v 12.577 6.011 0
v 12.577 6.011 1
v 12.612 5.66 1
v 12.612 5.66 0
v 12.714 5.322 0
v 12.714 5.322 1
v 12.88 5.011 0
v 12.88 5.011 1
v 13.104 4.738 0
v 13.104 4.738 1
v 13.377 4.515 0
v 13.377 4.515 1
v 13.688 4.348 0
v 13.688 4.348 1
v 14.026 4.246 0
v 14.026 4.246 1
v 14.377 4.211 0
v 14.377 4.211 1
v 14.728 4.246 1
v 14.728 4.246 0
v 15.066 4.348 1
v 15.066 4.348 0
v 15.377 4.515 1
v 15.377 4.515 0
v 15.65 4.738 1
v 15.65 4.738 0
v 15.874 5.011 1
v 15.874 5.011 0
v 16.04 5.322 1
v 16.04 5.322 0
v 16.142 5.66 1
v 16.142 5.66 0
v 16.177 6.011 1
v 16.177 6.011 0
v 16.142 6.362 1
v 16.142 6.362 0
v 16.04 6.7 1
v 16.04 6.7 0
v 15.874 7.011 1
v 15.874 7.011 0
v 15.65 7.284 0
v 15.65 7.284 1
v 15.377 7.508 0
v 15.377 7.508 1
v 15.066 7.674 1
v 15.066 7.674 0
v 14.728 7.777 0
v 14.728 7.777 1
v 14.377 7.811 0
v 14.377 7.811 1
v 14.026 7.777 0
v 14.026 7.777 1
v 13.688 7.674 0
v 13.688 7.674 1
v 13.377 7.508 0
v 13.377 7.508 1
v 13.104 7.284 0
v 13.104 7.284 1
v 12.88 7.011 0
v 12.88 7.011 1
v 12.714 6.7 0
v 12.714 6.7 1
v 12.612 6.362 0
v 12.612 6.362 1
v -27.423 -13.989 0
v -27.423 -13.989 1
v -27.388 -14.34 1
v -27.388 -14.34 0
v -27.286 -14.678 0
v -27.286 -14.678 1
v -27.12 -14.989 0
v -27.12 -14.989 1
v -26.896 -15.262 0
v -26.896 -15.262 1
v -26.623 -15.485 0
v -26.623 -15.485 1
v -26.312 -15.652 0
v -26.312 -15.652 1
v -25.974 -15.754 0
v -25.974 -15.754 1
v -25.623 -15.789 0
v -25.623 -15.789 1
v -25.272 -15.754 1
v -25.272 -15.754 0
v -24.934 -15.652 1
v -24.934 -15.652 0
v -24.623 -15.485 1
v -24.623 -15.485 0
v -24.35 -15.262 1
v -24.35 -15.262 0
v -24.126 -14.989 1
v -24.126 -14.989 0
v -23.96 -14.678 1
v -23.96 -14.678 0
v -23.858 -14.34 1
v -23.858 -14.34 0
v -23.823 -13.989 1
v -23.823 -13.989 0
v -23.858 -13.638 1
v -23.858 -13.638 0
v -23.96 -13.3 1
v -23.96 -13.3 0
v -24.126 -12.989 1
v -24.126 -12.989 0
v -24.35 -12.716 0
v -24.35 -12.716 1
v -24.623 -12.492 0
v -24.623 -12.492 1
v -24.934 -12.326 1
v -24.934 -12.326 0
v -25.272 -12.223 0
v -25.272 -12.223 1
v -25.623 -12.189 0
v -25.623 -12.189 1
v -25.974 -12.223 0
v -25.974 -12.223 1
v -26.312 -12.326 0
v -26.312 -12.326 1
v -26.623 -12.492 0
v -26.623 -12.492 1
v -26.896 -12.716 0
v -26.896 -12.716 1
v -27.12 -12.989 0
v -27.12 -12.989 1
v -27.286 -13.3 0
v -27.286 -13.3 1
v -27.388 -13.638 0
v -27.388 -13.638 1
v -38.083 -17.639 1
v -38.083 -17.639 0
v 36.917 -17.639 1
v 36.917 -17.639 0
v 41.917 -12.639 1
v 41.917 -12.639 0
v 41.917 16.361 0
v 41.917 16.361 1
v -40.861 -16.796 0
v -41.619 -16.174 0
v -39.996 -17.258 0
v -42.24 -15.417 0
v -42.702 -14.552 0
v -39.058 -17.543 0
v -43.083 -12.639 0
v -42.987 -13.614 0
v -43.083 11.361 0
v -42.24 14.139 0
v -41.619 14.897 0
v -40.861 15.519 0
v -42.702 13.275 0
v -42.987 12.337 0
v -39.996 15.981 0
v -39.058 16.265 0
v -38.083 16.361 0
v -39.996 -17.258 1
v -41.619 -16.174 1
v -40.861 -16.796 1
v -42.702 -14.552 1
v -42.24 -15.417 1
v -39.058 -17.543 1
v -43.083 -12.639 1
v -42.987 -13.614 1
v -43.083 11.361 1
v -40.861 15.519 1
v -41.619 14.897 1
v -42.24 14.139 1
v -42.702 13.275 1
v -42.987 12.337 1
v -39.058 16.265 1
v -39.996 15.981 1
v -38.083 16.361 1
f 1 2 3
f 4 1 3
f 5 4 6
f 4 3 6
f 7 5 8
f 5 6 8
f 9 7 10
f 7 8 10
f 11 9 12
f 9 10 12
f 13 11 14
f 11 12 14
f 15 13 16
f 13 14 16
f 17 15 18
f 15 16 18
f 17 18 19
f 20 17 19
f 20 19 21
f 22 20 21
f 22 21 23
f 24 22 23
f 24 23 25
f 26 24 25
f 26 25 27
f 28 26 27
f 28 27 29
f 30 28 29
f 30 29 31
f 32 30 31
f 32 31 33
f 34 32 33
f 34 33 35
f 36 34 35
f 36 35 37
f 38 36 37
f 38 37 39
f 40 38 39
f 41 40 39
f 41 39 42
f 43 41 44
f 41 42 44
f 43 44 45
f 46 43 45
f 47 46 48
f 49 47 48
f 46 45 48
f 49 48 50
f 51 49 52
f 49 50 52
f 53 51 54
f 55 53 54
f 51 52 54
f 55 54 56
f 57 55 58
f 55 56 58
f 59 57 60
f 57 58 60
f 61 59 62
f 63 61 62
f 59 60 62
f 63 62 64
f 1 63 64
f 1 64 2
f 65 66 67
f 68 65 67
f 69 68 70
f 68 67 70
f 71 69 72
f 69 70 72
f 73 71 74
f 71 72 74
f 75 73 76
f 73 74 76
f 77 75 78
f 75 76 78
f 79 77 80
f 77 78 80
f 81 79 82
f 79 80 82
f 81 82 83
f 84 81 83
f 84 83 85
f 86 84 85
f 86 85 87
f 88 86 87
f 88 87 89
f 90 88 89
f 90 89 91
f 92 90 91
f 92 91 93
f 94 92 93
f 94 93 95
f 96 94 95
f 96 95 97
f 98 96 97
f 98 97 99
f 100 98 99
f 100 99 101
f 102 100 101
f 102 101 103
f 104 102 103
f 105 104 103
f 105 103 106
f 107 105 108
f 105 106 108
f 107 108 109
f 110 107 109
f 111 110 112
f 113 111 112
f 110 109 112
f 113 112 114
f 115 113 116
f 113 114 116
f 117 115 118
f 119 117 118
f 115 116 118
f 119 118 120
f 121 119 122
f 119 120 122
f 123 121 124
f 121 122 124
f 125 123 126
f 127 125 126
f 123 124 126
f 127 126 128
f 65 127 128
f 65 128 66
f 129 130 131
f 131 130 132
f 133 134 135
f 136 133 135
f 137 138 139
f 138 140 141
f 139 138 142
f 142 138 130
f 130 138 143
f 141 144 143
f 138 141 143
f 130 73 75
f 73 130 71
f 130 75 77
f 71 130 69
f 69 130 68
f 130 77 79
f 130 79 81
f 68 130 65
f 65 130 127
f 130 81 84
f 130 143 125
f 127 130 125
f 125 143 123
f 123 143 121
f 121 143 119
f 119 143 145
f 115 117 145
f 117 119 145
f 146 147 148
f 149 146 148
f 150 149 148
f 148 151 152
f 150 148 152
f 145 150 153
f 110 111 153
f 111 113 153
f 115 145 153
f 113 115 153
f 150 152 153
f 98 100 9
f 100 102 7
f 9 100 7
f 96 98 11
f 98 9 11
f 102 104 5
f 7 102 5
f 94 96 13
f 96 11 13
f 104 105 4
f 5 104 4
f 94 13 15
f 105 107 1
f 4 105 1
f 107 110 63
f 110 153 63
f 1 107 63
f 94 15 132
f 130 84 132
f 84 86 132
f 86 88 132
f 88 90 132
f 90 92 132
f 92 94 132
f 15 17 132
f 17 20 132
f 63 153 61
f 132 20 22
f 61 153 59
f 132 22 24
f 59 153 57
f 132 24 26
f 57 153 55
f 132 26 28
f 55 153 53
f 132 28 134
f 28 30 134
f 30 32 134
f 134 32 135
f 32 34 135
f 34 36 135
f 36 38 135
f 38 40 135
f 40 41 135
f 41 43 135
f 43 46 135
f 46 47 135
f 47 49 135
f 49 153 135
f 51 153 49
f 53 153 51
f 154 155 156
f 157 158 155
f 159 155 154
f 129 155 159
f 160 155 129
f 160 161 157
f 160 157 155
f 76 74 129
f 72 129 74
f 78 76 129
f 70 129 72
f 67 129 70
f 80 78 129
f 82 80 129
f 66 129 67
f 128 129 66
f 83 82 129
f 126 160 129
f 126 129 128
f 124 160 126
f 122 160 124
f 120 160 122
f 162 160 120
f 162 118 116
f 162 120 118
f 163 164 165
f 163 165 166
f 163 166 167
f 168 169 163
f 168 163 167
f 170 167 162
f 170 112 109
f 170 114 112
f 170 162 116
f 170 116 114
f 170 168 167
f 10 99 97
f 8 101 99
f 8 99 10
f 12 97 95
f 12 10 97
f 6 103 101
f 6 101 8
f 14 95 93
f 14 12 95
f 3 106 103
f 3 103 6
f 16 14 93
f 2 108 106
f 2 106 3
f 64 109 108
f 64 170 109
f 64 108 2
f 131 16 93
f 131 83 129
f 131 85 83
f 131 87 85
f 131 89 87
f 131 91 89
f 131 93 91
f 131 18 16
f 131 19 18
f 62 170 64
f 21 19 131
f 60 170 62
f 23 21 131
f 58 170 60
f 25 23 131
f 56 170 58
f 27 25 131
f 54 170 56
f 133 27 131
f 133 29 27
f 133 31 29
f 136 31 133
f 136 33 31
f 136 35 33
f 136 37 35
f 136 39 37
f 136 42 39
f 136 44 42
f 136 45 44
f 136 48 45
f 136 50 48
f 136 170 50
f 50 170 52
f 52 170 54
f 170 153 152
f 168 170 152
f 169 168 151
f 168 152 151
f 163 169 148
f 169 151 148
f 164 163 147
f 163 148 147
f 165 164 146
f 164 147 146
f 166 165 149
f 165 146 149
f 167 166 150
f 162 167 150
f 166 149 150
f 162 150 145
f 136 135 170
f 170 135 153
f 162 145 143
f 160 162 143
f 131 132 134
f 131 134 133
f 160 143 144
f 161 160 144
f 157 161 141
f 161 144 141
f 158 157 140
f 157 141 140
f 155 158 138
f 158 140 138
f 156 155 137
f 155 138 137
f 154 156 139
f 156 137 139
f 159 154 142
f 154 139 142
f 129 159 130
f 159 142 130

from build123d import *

# Parameters (mm, degrees)
F1_DEPTH = 1
F3_D     = 3.6
F4_SIZE  = 5


with BuildPart() as f1:
    # F0 (on Top) → F1 (new body)
    with BuildSketch(Plane.XY):
        with BuildLine():
            Line((41.9170247219, -17.6387755275), (41.9170247219, 16.3612244725))
            Line((41.9170247219, 16.3612244725), (-38.0829752781, 16.3612244725))
            ThreePointArc((-38.0829752781, 16.3612244725), (-41.618509184, 14.8967583785), (-43.0829752781, 11.3612244725))
            Line((-43.0829752781, 11.3612244725), (-43.0829752781, -12.6387755275))
            ThreePointArc((-43.0829752781, -12.6387755275), (-41.618509184, -16.1743094334), (-38.0829752781, -17.6387755275))
            Line((-38.0829752781, -17.6387755275), (41.9170247219, -17.6387755275))
        make_face()
    extrude(amount=F1_DEPTH)

    # F3 (through all)
    with Locations(Plane(origin=(0, 0, 0), x_dir=(1, 0, 0), z_dir=(0, 0, -1))):
        with Locations((-25.6229752781, 13.9887755275), (14.3770247219, -6.0112244725)):
            Hole(F3_D / 2)

    # F4
    f4_edges = [f1.edges().sort_by_distance(p)[0] for p in [
        (41.917025, -17.638776, 0.5),
    ]]
    chamfer(f4_edges, length=F4_SIZE)


solid = f1.part
